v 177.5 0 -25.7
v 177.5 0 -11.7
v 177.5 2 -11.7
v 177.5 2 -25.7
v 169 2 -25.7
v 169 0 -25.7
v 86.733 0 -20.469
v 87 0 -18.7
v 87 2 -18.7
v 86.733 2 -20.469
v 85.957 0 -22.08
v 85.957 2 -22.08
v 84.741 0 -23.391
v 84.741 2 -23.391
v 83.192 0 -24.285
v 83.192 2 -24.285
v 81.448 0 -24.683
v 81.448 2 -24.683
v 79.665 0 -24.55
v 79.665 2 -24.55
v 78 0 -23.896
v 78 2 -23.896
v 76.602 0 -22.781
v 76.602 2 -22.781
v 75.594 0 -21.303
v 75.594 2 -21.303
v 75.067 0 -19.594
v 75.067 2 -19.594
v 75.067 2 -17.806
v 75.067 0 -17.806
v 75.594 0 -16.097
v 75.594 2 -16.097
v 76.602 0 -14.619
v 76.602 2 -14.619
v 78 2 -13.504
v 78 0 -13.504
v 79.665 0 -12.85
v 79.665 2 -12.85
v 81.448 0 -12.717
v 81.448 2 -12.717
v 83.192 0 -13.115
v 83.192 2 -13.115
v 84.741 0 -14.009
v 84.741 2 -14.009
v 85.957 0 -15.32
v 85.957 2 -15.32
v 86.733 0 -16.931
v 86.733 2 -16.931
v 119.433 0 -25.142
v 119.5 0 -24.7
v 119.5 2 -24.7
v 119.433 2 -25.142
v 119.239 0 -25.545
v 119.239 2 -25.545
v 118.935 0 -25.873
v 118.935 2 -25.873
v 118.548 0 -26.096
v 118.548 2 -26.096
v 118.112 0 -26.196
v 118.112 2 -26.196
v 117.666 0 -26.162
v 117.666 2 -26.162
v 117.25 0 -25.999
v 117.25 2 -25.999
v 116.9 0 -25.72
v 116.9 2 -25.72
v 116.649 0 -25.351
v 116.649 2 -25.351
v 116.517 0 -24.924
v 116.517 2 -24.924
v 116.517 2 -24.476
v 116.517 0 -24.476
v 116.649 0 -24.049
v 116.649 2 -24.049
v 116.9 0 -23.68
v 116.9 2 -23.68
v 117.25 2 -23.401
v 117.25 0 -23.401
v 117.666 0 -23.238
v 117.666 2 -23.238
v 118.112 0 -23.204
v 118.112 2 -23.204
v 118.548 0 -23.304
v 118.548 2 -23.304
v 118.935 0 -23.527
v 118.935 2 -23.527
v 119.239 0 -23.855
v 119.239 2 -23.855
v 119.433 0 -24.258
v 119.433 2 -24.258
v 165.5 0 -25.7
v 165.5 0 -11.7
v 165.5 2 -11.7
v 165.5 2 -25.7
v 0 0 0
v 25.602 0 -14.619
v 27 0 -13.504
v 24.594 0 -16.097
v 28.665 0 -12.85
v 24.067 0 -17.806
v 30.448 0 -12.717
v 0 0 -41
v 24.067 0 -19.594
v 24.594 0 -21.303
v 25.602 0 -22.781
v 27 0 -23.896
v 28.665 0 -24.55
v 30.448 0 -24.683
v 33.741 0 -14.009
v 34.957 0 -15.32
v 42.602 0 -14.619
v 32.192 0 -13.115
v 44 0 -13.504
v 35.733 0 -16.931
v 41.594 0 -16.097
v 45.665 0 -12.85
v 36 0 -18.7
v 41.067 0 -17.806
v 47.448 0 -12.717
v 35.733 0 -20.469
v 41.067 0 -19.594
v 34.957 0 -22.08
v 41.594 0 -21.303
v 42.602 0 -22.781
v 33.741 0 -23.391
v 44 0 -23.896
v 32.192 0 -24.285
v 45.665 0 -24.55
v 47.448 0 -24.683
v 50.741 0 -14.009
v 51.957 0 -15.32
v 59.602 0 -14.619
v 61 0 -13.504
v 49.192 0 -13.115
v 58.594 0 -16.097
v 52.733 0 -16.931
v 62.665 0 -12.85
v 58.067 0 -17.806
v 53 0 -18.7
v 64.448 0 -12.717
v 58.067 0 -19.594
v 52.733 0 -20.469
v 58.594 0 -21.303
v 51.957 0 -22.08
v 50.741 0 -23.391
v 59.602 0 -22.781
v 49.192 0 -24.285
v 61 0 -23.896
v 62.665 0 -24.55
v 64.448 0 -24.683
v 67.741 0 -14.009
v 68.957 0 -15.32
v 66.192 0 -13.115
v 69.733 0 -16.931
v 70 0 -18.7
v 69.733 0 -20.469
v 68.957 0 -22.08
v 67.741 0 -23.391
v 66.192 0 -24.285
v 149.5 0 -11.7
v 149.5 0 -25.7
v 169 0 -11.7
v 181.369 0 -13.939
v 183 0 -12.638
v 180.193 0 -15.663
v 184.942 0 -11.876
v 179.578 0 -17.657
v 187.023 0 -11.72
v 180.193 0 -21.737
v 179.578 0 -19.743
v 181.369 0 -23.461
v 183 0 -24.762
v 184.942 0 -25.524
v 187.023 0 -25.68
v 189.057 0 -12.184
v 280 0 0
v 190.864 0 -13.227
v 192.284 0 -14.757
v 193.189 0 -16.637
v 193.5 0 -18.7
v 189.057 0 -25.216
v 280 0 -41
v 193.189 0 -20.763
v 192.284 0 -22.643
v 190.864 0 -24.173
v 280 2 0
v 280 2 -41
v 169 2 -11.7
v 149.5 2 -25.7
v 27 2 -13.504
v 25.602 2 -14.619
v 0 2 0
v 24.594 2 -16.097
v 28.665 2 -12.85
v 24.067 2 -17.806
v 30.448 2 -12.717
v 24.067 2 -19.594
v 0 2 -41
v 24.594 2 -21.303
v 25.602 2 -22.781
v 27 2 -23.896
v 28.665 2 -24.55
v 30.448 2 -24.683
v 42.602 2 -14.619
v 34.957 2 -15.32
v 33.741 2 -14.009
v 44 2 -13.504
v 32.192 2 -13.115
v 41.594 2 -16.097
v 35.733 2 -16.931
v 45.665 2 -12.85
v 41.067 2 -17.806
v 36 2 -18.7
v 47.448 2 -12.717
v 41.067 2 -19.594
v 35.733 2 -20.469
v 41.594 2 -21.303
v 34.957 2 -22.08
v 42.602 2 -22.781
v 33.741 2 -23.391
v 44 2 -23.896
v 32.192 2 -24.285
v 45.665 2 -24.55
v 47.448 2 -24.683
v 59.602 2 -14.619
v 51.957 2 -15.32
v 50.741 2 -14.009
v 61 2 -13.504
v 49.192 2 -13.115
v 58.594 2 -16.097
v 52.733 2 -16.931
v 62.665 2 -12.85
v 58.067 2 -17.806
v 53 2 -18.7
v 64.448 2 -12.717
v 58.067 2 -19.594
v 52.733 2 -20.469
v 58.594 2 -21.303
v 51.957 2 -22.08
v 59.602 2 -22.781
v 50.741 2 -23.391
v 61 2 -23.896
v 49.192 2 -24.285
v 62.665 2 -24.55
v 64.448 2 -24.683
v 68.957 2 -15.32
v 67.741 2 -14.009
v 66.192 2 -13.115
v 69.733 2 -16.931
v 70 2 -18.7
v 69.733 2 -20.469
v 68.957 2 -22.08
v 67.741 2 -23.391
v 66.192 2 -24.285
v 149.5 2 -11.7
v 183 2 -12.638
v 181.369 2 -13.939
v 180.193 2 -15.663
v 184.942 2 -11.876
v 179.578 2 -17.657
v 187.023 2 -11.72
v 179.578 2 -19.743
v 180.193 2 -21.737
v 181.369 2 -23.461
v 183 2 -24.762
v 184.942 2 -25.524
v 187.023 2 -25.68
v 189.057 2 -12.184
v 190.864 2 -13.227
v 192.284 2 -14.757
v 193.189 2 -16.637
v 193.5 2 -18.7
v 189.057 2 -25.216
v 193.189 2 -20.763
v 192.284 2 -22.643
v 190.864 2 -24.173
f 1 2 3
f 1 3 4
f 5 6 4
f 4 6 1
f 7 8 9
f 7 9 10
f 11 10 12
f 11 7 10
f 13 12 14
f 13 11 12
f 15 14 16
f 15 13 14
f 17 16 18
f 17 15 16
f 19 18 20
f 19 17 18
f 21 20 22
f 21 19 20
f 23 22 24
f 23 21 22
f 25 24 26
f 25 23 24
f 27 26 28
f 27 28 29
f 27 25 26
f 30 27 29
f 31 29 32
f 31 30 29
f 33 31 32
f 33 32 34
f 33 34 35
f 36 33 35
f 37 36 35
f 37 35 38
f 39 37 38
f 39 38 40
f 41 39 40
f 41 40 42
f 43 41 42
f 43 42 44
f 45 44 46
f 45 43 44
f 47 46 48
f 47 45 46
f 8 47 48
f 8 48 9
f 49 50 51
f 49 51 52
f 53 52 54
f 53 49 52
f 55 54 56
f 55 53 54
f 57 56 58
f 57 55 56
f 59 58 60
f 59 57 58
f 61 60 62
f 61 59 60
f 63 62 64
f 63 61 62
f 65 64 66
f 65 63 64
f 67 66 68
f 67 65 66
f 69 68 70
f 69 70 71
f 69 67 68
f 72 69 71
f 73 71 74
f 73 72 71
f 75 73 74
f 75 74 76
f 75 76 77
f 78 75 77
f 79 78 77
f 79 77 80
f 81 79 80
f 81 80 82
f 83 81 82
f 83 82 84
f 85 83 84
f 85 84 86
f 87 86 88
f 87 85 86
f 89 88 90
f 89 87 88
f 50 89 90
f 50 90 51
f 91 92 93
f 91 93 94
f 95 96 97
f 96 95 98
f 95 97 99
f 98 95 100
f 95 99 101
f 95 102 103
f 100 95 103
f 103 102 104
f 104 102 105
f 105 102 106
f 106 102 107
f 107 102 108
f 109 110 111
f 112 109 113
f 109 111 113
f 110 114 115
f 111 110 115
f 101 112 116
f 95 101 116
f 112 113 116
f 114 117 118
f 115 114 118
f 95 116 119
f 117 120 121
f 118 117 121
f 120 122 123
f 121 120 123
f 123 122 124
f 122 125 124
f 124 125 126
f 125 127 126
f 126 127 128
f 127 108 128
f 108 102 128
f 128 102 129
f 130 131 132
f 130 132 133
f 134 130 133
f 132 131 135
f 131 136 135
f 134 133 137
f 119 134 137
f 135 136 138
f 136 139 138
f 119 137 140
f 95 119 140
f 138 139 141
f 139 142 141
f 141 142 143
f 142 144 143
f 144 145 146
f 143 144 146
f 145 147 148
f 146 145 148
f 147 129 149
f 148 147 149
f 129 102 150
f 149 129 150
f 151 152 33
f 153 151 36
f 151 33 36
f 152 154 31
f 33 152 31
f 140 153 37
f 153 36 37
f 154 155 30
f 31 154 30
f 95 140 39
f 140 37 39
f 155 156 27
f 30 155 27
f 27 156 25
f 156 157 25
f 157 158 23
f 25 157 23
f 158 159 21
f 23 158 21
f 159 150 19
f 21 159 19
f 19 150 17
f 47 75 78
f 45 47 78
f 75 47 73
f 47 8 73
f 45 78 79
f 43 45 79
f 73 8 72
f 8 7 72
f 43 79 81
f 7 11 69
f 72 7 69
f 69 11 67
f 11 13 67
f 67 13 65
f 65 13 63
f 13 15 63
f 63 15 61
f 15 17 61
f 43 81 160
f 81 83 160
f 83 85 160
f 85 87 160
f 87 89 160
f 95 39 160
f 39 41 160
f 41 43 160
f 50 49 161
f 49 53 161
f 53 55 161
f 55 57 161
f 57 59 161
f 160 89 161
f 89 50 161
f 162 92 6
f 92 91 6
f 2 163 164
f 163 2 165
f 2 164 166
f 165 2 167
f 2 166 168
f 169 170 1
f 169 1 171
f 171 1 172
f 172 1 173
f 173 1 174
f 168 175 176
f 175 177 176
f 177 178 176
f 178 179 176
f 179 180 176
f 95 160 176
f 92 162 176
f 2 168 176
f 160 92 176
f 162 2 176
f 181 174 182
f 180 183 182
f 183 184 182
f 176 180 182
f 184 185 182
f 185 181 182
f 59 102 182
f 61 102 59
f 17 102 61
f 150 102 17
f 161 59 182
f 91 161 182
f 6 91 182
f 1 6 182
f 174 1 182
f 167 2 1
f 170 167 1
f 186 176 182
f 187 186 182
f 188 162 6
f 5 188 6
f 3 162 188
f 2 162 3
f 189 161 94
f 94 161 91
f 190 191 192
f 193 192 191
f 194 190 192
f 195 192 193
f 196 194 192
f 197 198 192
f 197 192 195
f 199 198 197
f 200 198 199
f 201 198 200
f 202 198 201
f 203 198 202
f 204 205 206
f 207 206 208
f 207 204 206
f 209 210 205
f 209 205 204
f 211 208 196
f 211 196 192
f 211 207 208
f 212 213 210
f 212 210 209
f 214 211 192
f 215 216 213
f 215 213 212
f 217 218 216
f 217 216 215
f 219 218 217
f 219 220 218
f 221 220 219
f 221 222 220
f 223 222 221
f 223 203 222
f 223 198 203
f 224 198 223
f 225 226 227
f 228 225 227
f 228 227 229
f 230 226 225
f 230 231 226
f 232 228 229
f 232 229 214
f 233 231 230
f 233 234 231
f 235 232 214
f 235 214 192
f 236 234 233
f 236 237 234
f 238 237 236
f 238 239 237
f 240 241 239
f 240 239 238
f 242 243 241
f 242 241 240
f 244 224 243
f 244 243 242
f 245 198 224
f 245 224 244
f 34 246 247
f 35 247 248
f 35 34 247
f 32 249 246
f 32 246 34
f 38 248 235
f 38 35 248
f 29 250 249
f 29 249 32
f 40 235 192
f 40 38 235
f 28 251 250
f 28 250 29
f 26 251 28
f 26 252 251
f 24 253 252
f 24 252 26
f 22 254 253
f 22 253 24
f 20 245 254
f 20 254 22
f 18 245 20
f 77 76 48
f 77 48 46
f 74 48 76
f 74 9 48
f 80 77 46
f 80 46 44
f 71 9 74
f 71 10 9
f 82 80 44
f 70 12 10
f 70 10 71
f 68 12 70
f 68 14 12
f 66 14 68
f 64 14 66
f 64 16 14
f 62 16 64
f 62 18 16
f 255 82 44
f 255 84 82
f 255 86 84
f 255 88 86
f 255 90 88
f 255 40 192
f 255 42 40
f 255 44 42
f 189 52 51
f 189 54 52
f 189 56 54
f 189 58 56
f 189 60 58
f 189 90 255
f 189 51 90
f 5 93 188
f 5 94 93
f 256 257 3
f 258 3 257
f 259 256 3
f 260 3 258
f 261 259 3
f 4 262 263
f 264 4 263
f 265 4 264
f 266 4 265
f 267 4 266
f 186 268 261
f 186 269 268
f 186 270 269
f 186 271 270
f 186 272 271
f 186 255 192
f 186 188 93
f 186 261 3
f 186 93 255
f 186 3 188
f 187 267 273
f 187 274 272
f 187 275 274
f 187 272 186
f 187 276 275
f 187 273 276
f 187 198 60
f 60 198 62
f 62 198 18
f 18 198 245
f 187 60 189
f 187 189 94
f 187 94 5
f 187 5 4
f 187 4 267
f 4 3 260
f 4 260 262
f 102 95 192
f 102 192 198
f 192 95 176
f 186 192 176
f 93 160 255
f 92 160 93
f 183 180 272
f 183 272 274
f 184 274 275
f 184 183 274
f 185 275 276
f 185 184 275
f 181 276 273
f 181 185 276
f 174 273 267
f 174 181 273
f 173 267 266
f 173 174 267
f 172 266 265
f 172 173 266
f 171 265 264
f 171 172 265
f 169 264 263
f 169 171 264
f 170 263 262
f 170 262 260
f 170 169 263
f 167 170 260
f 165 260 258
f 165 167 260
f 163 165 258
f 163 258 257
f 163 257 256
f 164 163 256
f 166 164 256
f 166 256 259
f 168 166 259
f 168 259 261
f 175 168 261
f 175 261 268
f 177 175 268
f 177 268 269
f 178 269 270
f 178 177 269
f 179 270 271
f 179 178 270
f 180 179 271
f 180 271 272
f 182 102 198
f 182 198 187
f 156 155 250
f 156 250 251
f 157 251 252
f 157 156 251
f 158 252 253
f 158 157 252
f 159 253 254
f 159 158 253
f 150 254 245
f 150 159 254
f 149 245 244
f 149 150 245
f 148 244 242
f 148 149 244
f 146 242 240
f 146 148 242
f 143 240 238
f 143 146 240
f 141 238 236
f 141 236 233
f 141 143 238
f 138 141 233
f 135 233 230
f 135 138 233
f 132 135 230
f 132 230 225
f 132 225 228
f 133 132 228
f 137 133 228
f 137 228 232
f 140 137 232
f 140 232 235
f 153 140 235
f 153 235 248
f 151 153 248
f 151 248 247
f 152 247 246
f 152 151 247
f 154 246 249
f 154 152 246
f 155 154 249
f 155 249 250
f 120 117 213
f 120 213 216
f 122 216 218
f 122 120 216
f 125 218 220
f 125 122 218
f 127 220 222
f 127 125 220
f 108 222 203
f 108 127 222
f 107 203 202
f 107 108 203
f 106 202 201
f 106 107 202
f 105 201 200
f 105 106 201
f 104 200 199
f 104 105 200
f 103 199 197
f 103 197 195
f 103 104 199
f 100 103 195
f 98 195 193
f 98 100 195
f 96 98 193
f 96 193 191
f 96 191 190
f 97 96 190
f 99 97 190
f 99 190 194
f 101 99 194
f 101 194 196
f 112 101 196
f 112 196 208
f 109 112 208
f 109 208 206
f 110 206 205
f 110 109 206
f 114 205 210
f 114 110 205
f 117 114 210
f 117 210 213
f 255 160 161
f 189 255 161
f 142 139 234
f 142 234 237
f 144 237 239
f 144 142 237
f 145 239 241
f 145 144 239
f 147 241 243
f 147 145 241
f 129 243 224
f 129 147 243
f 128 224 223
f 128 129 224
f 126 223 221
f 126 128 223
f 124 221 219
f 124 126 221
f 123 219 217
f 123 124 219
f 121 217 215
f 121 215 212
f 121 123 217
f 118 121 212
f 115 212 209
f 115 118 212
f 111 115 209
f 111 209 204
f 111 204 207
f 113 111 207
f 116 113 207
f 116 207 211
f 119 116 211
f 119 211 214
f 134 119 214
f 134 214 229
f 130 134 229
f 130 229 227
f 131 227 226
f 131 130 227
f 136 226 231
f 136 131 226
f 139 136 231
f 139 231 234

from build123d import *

# Parameters (mm, degrees)
SKETCH_1_W      = 280
SKETCH_1_H      = 41
SKETCH_1_R      = 6
SKETCH_1_R_2    = 7
SKETCH_1_R_3    = 1.5
SKETCH_1_W_2    = 16
SKETCH_1_H_2    = 14
SKETCH_1_W_3    = 8.5
EXTRUDE_1_DEPTH = 2


with BuildPart() as part:
    # 草图1 → 凸台-拉伸1 (new body)
    with BuildSketch(Plane(origin=(0, 0, 0), x_dir=(1, 0, 0), z_dir=(0, 1, 0))):
        with Locations((140, 20.5)):
            Rectangle(SKETCH_1_W, SKETCH_1_H)
        with Locations((30, 18.7)):
            Circle(SKETCH_1_R, mode=Mode.SUBTRACT)
        with Locations((47, 18.7)):
            Circle(SKETCH_1_R, mode=Mode.SUBTRACT)
        with Locations((64, 18.7)):
            Circle(SKETCH_1_R, mode=Mode.SUBTRACT)
        with Locations((81, 18.7)):
            Circle(SKETCH_1_R, mode=Mode.SUBTRACT)
        with Locations((186.5, 18.7)):
            Circle(SKETCH_1_R_2, mode=Mode.SUBTRACT)
        with Locations((118, 24.7)):
            Circle(SKETCH_1_R_3, mode=Mode.SUBTRACT)
        with Locations((157.5, 18.7)):
            Rectangle(SKETCH_1_W_2, SKETCH_1_H_2, mode=Mode.SUBTRACT)
        with Locations((173.25, 18.7)):
            Rectangle(SKETCH_1_W_3, SKETCH_1_H_2, mode=Mode.SUBTRACT)
    extrude(amount=EXTRUDE_1_DEPTH)


solid = part.part
